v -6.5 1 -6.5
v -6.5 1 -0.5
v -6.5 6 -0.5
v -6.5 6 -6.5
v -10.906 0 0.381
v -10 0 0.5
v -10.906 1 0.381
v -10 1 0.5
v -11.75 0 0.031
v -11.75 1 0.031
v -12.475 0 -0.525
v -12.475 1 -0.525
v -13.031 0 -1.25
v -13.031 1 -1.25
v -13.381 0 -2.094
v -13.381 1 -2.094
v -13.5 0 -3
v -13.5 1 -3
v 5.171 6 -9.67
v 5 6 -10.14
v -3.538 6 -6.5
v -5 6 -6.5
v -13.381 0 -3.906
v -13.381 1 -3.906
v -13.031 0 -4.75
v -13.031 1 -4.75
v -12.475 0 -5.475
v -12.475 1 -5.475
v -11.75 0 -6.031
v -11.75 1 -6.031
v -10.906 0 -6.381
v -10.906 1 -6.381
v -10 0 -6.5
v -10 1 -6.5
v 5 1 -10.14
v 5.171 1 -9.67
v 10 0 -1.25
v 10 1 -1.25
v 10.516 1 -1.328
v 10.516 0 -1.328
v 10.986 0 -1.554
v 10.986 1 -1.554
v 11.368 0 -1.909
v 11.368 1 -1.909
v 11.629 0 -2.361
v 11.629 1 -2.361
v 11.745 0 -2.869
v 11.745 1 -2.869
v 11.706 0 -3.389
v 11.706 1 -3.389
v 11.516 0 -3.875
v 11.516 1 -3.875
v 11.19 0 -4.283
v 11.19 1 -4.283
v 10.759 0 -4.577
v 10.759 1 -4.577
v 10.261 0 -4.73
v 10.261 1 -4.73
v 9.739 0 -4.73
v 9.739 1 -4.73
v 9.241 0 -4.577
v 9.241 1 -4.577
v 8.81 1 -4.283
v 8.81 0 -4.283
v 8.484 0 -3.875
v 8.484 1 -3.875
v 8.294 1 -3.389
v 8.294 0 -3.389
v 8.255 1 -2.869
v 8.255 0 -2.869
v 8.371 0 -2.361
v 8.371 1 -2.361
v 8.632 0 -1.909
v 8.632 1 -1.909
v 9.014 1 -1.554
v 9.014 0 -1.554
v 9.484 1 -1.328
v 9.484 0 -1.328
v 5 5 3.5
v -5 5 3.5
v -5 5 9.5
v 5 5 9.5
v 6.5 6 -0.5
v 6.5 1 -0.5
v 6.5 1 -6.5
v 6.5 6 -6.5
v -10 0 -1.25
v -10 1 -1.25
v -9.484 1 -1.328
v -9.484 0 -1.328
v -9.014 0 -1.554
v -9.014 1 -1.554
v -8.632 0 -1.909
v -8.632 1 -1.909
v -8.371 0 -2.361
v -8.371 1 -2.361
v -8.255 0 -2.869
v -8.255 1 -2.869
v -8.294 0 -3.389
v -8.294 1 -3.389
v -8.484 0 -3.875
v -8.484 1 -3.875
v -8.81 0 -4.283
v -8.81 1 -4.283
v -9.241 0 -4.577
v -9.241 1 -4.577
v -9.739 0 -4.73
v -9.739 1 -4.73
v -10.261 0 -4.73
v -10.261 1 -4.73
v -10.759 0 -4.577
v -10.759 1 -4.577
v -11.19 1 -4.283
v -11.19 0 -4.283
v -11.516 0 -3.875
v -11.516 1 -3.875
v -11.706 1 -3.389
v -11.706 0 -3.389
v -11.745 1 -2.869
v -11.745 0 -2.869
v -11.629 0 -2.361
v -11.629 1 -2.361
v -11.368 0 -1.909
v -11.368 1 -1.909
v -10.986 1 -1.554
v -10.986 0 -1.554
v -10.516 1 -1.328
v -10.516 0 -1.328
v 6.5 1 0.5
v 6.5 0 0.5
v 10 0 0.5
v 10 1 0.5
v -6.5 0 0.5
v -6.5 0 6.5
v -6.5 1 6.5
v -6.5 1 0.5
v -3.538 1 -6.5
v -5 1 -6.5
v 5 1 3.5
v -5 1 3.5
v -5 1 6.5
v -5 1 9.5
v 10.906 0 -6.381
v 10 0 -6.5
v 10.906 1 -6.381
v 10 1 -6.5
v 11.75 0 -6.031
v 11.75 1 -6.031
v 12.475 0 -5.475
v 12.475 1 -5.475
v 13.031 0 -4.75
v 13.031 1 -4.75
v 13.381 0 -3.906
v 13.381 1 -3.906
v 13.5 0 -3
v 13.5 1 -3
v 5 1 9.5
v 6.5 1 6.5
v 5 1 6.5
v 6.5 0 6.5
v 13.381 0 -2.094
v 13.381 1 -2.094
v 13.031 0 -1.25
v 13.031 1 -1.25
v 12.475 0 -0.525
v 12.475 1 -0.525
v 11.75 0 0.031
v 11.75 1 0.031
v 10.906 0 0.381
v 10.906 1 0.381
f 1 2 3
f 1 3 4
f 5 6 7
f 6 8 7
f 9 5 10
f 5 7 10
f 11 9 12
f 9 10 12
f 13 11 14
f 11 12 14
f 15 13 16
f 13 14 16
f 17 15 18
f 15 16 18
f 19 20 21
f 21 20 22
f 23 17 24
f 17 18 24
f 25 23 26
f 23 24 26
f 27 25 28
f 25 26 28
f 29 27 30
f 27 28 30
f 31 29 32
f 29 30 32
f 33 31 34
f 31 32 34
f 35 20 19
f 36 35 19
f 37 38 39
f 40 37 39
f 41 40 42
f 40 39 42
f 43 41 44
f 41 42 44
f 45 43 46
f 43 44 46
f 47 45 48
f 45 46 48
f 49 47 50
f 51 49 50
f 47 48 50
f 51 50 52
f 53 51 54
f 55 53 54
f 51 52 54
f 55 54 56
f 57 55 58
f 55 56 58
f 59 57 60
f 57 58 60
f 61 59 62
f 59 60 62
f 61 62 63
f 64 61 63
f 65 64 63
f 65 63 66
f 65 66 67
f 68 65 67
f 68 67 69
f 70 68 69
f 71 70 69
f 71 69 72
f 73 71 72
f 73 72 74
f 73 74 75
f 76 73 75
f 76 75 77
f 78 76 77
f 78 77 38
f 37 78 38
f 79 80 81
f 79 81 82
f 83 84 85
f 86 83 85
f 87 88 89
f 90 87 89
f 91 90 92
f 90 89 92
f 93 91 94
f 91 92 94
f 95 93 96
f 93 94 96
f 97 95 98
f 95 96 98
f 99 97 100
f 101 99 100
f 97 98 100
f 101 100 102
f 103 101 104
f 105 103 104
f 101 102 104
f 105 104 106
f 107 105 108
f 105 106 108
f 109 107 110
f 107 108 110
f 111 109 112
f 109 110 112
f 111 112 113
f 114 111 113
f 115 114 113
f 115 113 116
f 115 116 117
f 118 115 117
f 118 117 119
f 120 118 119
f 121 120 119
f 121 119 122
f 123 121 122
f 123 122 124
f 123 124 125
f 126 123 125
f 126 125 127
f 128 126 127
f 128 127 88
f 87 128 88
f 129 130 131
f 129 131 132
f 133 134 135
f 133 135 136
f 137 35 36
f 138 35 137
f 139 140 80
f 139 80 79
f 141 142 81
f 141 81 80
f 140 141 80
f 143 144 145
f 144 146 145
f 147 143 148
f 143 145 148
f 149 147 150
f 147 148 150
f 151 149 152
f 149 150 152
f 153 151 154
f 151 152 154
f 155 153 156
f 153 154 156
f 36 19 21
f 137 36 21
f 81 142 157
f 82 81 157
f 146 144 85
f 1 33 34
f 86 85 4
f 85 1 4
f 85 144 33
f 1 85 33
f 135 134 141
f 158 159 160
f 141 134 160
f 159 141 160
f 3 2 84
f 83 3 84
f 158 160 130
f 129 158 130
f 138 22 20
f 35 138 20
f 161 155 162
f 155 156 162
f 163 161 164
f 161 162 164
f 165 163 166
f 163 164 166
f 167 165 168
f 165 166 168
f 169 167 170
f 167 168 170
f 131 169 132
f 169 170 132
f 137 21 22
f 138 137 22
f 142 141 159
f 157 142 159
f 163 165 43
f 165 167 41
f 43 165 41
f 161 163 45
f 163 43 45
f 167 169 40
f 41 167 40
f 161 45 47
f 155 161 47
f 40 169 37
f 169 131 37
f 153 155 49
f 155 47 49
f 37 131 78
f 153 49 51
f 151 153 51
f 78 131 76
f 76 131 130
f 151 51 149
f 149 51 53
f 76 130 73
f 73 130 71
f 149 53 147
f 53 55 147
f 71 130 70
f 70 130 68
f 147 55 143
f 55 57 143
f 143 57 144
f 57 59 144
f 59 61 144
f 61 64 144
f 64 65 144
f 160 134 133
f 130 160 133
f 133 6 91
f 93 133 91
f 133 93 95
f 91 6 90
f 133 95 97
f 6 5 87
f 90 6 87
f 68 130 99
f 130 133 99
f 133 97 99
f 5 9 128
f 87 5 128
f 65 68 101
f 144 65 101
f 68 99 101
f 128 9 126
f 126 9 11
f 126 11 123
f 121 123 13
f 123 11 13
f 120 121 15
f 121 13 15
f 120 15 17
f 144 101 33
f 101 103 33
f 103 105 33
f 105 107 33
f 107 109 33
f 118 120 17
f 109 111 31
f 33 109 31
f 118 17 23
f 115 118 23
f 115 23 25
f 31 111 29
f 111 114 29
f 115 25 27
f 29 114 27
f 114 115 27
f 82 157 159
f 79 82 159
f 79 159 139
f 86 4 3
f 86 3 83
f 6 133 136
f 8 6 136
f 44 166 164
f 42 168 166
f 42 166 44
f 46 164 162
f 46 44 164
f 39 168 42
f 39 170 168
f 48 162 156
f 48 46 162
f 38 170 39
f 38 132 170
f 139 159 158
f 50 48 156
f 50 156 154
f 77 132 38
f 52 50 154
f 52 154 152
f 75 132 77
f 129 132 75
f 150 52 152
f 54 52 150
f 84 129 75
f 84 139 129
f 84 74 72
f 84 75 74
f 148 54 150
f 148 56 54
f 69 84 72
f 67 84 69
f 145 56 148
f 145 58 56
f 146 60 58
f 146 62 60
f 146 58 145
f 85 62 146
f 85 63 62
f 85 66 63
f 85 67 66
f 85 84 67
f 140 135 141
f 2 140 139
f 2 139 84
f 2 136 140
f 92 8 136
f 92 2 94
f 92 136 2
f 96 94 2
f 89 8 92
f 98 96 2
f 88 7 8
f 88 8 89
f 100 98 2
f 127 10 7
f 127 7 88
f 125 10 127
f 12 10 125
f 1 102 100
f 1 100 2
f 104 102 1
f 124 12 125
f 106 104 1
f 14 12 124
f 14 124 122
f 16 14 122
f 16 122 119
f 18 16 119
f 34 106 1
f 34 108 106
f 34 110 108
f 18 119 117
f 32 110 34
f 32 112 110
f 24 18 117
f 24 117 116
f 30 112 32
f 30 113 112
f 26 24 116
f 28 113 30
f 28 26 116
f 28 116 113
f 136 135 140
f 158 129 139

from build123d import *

# Parameters (mm, degrees)
SKETCH1_W           = 13
SKETCH1_H           = 13
BOSS_EXTRUDE1_DEPTH = 1
SKETCH4_W           = 7
SKETCH4_H           = 1
BOSS_EXTRUDE2_DEPTH = 7
SKETCH5_W           = 7
SKETCH5_H           = 1
BOSS_EXTRUDE3_DEPTH = 7
SKETCH6_R           = 1.75
CUT_EXTRUDE1_DEPTH  = 16.016657418
SKETCH7_W           = 10
SKETCH7_H           = 6
BOSS_EXTRUDE4_DEPTH = 4
SKETCH8_W           = 13
SKETCH8_H           = 6
BOSS_EXTRUDE5_DEPTH = 5
BOSS_EXTRUDE7_DEPTH = 5
FILLET1_R           = 3.5


with BuildPart() as part:
    # Sketch1 → Boss-Extrude1 (new body)
    with BuildSketch(Plane(origin=(0, 0, 0), x_dir=(1, 0, 0), z_dir=(0, 1, 0))):
        Rectangle(SKETCH1_W, SKETCH1_H)
    extrude(amount=BOSS_EXTRUDE1_DEPTH)

    # Sketch4 → Boss-Extrude2 (add)
    with BuildSketch(Plane.ZY.offset(6.5)):
        with Locations((-3, 0.5)):
            Rectangle(SKETCH4_W, SKETCH4_H)
    extrude(amount=BOSS_EXTRUDE2_DEPTH)

    # Sketch5 → Boss-Extrude3 (add)
    with BuildSketch(Plane(origin=(6.5, 0, 0), x_dir=(0, 0, -1), z_dir=(1, 0, 0))):
        with Locations((3, 0.5)):
            Rectangle(SKETCH5_W, SKETCH5_H)
    extrude(amount=BOSS_EXTRUDE3_DEPTH)

    # Sketch6 → Cut-Extrude1 (cut, through all)
    with BuildSketch(Plane(origin=(0, 1, 0), x_dir=(1, 0, 0), z_dir=(0, 1, 0))):
        with Locations(Location((-10, 3, 0), (0, 0, 270))):
            Circle(SKETCH6_R)
        with Locations(Location((10, 3, 0), (0, 0, 270))):
            Circle(SKETCH6_R)
    extrude(amount=-CUT_EXTRUDE1_DEPTH, mode=Mode.SUBTRACT)

    # Sketch7 → Boss-Extrude4 (add)
    with BuildSketch(Plane(origin=(0, 1, 0), x_dir=(1, 0, 0), z_dir=(0, 1, 0))):
        with Locations((0, -6.5)):
            Rectangle(SKETCH7_W, SKETCH7_H)
    extrude(amount=BOSS_EXTRUDE4_DEPTH)

    # Sketch8 → Boss-Extrude5 (add)
    with BuildSketch(Plane(origin=(0, 1, 0), x_dir=(1, 0, 0), z_dir=(0, 1, 0))):
        with Locations((0, 3.5)):
            Rectangle(SKETCH8_W, SKETCH8_H)
    extrude(amount=BOSS_EXTRUDE5_DEPTH)

    # Fillet1
    fillet1_edges = [part.edges().sort_by_distance(p)[0] for p in [
        (13.5, 0.5, -6.5),
        (13.5, 0.5, 0.5),
        (-13.5, 0.5, 0.5),
        (-13.5, 0.5, -6.5),
    ]]
    fillet(fillet1_edges, radius=FILLET1_R - 0.0001)  # a hair under: the kernel refuses the full size


with BuildPart() as body_2:
    # Sketch12 → Boss-Extrude7 (new body)
    with BuildSketch(Plane(origin=(0, 6, 0), x_dir=(1, 0, 0), z_dir=(0, 1, 0))):
        Polygon((-5, 6.5), (5, 10.139702343), (5.171010072, 9.669856032), (-3.5380978, 6.5), align=None)
    extrude(amount=-BOSS_EXTRUDE7_DEPTH)


solid = Compound([part.part, body_2.part])
